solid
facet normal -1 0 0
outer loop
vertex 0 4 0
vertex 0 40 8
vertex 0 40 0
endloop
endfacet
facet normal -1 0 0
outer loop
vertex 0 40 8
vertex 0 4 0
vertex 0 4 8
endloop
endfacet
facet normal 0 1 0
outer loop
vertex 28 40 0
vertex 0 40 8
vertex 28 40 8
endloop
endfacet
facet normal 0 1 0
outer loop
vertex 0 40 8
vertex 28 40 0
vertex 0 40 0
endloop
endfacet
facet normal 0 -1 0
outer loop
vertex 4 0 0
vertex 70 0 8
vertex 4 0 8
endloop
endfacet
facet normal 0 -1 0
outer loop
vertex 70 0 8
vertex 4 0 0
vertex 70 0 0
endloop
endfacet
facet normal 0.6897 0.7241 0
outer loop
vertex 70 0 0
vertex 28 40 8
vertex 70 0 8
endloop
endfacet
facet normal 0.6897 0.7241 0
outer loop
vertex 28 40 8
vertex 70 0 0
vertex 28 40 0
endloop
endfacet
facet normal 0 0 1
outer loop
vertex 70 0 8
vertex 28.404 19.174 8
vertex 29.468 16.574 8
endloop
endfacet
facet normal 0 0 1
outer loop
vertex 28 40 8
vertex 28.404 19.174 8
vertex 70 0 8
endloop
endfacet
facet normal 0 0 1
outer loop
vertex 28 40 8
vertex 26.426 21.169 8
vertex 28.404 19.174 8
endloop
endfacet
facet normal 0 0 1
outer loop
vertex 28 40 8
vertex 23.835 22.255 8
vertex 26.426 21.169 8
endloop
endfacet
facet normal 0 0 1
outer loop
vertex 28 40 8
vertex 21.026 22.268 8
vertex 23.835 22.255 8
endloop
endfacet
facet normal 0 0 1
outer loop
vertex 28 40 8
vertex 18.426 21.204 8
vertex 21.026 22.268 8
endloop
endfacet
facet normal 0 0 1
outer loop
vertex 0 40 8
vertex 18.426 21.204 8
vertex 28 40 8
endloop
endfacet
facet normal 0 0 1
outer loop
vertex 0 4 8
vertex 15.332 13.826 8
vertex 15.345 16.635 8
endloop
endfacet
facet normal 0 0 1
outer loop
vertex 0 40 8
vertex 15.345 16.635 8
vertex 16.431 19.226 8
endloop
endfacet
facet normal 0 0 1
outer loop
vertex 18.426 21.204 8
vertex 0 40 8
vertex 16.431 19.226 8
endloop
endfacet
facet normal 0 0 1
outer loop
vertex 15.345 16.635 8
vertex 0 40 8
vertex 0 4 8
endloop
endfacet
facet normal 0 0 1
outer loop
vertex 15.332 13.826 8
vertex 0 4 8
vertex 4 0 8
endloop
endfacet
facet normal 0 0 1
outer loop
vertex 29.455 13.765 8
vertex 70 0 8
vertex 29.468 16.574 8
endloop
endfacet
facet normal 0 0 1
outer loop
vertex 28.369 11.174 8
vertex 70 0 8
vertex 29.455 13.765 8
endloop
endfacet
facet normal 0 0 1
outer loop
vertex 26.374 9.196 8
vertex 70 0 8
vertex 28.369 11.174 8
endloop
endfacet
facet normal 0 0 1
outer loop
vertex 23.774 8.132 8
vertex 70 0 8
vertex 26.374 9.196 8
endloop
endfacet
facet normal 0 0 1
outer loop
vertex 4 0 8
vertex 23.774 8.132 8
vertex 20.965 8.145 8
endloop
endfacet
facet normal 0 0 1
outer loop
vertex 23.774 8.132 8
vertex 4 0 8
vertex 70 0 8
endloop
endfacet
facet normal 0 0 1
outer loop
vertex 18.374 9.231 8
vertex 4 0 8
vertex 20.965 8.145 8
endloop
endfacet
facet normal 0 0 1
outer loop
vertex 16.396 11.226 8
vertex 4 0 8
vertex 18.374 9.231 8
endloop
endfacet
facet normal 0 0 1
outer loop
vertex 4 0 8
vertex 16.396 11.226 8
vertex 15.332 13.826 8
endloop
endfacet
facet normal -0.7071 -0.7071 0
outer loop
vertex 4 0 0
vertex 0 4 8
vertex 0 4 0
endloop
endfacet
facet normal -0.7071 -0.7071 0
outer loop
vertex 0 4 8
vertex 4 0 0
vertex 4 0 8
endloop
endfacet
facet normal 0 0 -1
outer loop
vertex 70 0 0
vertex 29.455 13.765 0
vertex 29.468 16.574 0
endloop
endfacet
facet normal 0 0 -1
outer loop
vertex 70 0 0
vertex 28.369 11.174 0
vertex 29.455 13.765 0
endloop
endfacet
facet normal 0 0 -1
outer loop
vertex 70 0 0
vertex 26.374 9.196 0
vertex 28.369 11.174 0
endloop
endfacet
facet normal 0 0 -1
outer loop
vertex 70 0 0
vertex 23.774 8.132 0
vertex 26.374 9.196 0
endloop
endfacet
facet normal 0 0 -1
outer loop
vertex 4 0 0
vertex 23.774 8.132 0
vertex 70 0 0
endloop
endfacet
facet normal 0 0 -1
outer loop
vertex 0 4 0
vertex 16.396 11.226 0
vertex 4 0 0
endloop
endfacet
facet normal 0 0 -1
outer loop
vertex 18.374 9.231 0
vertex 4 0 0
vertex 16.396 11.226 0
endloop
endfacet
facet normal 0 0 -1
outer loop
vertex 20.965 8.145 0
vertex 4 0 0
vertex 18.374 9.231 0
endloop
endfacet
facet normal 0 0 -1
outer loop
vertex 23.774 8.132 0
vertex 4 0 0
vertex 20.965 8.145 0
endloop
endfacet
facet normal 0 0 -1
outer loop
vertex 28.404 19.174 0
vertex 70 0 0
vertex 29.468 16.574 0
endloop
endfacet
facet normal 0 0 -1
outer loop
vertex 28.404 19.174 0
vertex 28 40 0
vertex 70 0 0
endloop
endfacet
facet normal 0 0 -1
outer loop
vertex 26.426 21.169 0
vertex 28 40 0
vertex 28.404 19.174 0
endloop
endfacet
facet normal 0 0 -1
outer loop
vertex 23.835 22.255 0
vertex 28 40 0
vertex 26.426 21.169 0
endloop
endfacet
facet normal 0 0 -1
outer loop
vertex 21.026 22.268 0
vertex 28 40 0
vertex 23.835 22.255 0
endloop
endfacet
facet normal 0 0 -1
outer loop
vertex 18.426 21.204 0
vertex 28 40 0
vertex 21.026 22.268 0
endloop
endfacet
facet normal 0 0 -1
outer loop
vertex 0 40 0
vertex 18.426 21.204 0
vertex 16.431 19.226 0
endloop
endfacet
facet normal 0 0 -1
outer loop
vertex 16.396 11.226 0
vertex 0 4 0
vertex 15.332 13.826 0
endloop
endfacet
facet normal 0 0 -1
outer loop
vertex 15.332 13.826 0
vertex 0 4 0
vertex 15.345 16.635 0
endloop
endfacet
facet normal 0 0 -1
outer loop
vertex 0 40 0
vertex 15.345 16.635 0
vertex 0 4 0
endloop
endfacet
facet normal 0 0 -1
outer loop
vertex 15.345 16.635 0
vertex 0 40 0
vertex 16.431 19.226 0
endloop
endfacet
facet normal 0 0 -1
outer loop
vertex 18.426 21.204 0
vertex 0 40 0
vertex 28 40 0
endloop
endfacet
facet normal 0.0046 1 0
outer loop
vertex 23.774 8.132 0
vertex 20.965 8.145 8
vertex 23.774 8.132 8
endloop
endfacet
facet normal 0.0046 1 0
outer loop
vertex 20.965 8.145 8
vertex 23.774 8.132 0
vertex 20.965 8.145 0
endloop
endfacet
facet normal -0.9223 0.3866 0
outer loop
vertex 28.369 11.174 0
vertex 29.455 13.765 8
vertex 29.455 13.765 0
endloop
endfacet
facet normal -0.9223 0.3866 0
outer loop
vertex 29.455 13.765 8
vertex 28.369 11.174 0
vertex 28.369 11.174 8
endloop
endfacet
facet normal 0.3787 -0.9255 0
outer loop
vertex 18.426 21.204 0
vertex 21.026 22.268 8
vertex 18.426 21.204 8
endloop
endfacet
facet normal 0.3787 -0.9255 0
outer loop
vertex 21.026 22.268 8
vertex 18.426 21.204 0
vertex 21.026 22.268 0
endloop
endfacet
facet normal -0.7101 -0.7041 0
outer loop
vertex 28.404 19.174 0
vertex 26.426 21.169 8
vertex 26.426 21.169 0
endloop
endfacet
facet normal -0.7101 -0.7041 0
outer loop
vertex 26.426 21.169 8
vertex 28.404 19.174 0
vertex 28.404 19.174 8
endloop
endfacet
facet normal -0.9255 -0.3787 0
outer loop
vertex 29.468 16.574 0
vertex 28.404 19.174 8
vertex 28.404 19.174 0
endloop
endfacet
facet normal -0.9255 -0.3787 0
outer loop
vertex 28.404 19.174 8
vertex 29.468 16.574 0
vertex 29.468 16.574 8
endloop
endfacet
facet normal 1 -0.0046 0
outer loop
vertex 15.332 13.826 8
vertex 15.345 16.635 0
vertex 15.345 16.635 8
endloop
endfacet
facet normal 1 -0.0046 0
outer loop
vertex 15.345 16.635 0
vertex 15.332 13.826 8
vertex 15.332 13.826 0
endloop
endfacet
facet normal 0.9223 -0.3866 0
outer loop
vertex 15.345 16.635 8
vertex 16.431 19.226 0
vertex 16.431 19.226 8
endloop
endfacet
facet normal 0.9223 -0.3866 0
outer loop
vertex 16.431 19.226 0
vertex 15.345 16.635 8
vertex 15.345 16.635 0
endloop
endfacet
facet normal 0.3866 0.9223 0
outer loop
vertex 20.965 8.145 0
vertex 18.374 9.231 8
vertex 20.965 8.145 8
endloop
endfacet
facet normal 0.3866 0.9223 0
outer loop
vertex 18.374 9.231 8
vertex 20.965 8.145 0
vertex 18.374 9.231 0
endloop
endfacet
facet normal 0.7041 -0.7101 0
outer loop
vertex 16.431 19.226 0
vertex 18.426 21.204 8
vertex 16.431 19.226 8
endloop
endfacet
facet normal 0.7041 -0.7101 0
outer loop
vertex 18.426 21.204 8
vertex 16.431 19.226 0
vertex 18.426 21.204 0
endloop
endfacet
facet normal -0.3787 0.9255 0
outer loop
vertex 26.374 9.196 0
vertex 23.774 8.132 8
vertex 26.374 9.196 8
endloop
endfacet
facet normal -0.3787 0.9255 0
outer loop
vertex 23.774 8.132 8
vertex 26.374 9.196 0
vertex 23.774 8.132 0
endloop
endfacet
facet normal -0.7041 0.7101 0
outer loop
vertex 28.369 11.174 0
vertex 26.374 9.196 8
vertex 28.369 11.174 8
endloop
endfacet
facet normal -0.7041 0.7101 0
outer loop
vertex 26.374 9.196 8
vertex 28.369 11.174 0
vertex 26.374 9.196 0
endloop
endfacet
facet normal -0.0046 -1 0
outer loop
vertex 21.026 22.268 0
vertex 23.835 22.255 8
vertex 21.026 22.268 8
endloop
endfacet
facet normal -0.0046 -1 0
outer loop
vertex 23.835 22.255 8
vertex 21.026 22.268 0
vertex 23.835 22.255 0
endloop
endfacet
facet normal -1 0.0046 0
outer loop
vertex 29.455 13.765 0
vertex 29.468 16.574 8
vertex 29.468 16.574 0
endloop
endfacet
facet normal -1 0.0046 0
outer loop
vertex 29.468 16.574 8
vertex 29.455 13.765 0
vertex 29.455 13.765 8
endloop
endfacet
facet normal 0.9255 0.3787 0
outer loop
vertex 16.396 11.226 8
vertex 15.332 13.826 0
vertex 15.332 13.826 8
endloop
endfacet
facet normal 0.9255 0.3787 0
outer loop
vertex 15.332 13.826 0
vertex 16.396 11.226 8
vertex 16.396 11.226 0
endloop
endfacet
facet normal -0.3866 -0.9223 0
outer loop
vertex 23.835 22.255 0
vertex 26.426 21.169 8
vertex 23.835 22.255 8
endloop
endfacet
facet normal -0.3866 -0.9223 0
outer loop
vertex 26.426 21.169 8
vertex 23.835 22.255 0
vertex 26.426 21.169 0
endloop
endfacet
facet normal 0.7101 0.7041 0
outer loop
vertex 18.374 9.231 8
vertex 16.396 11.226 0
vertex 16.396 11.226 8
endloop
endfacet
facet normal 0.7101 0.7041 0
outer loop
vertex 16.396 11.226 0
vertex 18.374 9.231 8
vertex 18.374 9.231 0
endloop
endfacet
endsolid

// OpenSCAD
$fn = 32;

// ----------------------------------------------------------------------
// Bracket plate: gusset 70 x 40
// ----------------------------------------------------------------------

// --- parameters (mm) ---
hole_r = 3;               // bolt hole radius
plate_t = 8;              // plate thickness, Z (extrusion height)
gus_a = 70;               // base length
gus_b = 40;               // height
top_x = 28;               // top edge X of the angled cut
light_r = 7.2;            // lightening hole radius

light_d = 2 * light_r;

profile = [[4, 0], [35, 0], [70, 0], [28, 40], [0, 40], [0, 4]];  // primary outline, 6 points, counter clockwise
void_1 = [[29.468, 16.574], [28.404, 19.174], [26.426, 21.169], [23.835, 22.255], [21.026, 22.268], [18.426, 21.204], [16.431, 19.226], [15.345, 16.635], [15.332, 13.826], [16.396, 11.226], [18.374, 9.231], [20.965, 8.145], [23.774, 8.132], [26.374, 9.196], [28.369, 11.174], [29.455, 13.765]];  // lightening hole, 16 points

// --- the one profile operation ---
difference() {
  linear_extrude(height = plate_t) polygon(points = profile);
  translate([0, 0, -1])
    linear_extrude(height = plate_t + 2) polygon(points = void_1);
}
